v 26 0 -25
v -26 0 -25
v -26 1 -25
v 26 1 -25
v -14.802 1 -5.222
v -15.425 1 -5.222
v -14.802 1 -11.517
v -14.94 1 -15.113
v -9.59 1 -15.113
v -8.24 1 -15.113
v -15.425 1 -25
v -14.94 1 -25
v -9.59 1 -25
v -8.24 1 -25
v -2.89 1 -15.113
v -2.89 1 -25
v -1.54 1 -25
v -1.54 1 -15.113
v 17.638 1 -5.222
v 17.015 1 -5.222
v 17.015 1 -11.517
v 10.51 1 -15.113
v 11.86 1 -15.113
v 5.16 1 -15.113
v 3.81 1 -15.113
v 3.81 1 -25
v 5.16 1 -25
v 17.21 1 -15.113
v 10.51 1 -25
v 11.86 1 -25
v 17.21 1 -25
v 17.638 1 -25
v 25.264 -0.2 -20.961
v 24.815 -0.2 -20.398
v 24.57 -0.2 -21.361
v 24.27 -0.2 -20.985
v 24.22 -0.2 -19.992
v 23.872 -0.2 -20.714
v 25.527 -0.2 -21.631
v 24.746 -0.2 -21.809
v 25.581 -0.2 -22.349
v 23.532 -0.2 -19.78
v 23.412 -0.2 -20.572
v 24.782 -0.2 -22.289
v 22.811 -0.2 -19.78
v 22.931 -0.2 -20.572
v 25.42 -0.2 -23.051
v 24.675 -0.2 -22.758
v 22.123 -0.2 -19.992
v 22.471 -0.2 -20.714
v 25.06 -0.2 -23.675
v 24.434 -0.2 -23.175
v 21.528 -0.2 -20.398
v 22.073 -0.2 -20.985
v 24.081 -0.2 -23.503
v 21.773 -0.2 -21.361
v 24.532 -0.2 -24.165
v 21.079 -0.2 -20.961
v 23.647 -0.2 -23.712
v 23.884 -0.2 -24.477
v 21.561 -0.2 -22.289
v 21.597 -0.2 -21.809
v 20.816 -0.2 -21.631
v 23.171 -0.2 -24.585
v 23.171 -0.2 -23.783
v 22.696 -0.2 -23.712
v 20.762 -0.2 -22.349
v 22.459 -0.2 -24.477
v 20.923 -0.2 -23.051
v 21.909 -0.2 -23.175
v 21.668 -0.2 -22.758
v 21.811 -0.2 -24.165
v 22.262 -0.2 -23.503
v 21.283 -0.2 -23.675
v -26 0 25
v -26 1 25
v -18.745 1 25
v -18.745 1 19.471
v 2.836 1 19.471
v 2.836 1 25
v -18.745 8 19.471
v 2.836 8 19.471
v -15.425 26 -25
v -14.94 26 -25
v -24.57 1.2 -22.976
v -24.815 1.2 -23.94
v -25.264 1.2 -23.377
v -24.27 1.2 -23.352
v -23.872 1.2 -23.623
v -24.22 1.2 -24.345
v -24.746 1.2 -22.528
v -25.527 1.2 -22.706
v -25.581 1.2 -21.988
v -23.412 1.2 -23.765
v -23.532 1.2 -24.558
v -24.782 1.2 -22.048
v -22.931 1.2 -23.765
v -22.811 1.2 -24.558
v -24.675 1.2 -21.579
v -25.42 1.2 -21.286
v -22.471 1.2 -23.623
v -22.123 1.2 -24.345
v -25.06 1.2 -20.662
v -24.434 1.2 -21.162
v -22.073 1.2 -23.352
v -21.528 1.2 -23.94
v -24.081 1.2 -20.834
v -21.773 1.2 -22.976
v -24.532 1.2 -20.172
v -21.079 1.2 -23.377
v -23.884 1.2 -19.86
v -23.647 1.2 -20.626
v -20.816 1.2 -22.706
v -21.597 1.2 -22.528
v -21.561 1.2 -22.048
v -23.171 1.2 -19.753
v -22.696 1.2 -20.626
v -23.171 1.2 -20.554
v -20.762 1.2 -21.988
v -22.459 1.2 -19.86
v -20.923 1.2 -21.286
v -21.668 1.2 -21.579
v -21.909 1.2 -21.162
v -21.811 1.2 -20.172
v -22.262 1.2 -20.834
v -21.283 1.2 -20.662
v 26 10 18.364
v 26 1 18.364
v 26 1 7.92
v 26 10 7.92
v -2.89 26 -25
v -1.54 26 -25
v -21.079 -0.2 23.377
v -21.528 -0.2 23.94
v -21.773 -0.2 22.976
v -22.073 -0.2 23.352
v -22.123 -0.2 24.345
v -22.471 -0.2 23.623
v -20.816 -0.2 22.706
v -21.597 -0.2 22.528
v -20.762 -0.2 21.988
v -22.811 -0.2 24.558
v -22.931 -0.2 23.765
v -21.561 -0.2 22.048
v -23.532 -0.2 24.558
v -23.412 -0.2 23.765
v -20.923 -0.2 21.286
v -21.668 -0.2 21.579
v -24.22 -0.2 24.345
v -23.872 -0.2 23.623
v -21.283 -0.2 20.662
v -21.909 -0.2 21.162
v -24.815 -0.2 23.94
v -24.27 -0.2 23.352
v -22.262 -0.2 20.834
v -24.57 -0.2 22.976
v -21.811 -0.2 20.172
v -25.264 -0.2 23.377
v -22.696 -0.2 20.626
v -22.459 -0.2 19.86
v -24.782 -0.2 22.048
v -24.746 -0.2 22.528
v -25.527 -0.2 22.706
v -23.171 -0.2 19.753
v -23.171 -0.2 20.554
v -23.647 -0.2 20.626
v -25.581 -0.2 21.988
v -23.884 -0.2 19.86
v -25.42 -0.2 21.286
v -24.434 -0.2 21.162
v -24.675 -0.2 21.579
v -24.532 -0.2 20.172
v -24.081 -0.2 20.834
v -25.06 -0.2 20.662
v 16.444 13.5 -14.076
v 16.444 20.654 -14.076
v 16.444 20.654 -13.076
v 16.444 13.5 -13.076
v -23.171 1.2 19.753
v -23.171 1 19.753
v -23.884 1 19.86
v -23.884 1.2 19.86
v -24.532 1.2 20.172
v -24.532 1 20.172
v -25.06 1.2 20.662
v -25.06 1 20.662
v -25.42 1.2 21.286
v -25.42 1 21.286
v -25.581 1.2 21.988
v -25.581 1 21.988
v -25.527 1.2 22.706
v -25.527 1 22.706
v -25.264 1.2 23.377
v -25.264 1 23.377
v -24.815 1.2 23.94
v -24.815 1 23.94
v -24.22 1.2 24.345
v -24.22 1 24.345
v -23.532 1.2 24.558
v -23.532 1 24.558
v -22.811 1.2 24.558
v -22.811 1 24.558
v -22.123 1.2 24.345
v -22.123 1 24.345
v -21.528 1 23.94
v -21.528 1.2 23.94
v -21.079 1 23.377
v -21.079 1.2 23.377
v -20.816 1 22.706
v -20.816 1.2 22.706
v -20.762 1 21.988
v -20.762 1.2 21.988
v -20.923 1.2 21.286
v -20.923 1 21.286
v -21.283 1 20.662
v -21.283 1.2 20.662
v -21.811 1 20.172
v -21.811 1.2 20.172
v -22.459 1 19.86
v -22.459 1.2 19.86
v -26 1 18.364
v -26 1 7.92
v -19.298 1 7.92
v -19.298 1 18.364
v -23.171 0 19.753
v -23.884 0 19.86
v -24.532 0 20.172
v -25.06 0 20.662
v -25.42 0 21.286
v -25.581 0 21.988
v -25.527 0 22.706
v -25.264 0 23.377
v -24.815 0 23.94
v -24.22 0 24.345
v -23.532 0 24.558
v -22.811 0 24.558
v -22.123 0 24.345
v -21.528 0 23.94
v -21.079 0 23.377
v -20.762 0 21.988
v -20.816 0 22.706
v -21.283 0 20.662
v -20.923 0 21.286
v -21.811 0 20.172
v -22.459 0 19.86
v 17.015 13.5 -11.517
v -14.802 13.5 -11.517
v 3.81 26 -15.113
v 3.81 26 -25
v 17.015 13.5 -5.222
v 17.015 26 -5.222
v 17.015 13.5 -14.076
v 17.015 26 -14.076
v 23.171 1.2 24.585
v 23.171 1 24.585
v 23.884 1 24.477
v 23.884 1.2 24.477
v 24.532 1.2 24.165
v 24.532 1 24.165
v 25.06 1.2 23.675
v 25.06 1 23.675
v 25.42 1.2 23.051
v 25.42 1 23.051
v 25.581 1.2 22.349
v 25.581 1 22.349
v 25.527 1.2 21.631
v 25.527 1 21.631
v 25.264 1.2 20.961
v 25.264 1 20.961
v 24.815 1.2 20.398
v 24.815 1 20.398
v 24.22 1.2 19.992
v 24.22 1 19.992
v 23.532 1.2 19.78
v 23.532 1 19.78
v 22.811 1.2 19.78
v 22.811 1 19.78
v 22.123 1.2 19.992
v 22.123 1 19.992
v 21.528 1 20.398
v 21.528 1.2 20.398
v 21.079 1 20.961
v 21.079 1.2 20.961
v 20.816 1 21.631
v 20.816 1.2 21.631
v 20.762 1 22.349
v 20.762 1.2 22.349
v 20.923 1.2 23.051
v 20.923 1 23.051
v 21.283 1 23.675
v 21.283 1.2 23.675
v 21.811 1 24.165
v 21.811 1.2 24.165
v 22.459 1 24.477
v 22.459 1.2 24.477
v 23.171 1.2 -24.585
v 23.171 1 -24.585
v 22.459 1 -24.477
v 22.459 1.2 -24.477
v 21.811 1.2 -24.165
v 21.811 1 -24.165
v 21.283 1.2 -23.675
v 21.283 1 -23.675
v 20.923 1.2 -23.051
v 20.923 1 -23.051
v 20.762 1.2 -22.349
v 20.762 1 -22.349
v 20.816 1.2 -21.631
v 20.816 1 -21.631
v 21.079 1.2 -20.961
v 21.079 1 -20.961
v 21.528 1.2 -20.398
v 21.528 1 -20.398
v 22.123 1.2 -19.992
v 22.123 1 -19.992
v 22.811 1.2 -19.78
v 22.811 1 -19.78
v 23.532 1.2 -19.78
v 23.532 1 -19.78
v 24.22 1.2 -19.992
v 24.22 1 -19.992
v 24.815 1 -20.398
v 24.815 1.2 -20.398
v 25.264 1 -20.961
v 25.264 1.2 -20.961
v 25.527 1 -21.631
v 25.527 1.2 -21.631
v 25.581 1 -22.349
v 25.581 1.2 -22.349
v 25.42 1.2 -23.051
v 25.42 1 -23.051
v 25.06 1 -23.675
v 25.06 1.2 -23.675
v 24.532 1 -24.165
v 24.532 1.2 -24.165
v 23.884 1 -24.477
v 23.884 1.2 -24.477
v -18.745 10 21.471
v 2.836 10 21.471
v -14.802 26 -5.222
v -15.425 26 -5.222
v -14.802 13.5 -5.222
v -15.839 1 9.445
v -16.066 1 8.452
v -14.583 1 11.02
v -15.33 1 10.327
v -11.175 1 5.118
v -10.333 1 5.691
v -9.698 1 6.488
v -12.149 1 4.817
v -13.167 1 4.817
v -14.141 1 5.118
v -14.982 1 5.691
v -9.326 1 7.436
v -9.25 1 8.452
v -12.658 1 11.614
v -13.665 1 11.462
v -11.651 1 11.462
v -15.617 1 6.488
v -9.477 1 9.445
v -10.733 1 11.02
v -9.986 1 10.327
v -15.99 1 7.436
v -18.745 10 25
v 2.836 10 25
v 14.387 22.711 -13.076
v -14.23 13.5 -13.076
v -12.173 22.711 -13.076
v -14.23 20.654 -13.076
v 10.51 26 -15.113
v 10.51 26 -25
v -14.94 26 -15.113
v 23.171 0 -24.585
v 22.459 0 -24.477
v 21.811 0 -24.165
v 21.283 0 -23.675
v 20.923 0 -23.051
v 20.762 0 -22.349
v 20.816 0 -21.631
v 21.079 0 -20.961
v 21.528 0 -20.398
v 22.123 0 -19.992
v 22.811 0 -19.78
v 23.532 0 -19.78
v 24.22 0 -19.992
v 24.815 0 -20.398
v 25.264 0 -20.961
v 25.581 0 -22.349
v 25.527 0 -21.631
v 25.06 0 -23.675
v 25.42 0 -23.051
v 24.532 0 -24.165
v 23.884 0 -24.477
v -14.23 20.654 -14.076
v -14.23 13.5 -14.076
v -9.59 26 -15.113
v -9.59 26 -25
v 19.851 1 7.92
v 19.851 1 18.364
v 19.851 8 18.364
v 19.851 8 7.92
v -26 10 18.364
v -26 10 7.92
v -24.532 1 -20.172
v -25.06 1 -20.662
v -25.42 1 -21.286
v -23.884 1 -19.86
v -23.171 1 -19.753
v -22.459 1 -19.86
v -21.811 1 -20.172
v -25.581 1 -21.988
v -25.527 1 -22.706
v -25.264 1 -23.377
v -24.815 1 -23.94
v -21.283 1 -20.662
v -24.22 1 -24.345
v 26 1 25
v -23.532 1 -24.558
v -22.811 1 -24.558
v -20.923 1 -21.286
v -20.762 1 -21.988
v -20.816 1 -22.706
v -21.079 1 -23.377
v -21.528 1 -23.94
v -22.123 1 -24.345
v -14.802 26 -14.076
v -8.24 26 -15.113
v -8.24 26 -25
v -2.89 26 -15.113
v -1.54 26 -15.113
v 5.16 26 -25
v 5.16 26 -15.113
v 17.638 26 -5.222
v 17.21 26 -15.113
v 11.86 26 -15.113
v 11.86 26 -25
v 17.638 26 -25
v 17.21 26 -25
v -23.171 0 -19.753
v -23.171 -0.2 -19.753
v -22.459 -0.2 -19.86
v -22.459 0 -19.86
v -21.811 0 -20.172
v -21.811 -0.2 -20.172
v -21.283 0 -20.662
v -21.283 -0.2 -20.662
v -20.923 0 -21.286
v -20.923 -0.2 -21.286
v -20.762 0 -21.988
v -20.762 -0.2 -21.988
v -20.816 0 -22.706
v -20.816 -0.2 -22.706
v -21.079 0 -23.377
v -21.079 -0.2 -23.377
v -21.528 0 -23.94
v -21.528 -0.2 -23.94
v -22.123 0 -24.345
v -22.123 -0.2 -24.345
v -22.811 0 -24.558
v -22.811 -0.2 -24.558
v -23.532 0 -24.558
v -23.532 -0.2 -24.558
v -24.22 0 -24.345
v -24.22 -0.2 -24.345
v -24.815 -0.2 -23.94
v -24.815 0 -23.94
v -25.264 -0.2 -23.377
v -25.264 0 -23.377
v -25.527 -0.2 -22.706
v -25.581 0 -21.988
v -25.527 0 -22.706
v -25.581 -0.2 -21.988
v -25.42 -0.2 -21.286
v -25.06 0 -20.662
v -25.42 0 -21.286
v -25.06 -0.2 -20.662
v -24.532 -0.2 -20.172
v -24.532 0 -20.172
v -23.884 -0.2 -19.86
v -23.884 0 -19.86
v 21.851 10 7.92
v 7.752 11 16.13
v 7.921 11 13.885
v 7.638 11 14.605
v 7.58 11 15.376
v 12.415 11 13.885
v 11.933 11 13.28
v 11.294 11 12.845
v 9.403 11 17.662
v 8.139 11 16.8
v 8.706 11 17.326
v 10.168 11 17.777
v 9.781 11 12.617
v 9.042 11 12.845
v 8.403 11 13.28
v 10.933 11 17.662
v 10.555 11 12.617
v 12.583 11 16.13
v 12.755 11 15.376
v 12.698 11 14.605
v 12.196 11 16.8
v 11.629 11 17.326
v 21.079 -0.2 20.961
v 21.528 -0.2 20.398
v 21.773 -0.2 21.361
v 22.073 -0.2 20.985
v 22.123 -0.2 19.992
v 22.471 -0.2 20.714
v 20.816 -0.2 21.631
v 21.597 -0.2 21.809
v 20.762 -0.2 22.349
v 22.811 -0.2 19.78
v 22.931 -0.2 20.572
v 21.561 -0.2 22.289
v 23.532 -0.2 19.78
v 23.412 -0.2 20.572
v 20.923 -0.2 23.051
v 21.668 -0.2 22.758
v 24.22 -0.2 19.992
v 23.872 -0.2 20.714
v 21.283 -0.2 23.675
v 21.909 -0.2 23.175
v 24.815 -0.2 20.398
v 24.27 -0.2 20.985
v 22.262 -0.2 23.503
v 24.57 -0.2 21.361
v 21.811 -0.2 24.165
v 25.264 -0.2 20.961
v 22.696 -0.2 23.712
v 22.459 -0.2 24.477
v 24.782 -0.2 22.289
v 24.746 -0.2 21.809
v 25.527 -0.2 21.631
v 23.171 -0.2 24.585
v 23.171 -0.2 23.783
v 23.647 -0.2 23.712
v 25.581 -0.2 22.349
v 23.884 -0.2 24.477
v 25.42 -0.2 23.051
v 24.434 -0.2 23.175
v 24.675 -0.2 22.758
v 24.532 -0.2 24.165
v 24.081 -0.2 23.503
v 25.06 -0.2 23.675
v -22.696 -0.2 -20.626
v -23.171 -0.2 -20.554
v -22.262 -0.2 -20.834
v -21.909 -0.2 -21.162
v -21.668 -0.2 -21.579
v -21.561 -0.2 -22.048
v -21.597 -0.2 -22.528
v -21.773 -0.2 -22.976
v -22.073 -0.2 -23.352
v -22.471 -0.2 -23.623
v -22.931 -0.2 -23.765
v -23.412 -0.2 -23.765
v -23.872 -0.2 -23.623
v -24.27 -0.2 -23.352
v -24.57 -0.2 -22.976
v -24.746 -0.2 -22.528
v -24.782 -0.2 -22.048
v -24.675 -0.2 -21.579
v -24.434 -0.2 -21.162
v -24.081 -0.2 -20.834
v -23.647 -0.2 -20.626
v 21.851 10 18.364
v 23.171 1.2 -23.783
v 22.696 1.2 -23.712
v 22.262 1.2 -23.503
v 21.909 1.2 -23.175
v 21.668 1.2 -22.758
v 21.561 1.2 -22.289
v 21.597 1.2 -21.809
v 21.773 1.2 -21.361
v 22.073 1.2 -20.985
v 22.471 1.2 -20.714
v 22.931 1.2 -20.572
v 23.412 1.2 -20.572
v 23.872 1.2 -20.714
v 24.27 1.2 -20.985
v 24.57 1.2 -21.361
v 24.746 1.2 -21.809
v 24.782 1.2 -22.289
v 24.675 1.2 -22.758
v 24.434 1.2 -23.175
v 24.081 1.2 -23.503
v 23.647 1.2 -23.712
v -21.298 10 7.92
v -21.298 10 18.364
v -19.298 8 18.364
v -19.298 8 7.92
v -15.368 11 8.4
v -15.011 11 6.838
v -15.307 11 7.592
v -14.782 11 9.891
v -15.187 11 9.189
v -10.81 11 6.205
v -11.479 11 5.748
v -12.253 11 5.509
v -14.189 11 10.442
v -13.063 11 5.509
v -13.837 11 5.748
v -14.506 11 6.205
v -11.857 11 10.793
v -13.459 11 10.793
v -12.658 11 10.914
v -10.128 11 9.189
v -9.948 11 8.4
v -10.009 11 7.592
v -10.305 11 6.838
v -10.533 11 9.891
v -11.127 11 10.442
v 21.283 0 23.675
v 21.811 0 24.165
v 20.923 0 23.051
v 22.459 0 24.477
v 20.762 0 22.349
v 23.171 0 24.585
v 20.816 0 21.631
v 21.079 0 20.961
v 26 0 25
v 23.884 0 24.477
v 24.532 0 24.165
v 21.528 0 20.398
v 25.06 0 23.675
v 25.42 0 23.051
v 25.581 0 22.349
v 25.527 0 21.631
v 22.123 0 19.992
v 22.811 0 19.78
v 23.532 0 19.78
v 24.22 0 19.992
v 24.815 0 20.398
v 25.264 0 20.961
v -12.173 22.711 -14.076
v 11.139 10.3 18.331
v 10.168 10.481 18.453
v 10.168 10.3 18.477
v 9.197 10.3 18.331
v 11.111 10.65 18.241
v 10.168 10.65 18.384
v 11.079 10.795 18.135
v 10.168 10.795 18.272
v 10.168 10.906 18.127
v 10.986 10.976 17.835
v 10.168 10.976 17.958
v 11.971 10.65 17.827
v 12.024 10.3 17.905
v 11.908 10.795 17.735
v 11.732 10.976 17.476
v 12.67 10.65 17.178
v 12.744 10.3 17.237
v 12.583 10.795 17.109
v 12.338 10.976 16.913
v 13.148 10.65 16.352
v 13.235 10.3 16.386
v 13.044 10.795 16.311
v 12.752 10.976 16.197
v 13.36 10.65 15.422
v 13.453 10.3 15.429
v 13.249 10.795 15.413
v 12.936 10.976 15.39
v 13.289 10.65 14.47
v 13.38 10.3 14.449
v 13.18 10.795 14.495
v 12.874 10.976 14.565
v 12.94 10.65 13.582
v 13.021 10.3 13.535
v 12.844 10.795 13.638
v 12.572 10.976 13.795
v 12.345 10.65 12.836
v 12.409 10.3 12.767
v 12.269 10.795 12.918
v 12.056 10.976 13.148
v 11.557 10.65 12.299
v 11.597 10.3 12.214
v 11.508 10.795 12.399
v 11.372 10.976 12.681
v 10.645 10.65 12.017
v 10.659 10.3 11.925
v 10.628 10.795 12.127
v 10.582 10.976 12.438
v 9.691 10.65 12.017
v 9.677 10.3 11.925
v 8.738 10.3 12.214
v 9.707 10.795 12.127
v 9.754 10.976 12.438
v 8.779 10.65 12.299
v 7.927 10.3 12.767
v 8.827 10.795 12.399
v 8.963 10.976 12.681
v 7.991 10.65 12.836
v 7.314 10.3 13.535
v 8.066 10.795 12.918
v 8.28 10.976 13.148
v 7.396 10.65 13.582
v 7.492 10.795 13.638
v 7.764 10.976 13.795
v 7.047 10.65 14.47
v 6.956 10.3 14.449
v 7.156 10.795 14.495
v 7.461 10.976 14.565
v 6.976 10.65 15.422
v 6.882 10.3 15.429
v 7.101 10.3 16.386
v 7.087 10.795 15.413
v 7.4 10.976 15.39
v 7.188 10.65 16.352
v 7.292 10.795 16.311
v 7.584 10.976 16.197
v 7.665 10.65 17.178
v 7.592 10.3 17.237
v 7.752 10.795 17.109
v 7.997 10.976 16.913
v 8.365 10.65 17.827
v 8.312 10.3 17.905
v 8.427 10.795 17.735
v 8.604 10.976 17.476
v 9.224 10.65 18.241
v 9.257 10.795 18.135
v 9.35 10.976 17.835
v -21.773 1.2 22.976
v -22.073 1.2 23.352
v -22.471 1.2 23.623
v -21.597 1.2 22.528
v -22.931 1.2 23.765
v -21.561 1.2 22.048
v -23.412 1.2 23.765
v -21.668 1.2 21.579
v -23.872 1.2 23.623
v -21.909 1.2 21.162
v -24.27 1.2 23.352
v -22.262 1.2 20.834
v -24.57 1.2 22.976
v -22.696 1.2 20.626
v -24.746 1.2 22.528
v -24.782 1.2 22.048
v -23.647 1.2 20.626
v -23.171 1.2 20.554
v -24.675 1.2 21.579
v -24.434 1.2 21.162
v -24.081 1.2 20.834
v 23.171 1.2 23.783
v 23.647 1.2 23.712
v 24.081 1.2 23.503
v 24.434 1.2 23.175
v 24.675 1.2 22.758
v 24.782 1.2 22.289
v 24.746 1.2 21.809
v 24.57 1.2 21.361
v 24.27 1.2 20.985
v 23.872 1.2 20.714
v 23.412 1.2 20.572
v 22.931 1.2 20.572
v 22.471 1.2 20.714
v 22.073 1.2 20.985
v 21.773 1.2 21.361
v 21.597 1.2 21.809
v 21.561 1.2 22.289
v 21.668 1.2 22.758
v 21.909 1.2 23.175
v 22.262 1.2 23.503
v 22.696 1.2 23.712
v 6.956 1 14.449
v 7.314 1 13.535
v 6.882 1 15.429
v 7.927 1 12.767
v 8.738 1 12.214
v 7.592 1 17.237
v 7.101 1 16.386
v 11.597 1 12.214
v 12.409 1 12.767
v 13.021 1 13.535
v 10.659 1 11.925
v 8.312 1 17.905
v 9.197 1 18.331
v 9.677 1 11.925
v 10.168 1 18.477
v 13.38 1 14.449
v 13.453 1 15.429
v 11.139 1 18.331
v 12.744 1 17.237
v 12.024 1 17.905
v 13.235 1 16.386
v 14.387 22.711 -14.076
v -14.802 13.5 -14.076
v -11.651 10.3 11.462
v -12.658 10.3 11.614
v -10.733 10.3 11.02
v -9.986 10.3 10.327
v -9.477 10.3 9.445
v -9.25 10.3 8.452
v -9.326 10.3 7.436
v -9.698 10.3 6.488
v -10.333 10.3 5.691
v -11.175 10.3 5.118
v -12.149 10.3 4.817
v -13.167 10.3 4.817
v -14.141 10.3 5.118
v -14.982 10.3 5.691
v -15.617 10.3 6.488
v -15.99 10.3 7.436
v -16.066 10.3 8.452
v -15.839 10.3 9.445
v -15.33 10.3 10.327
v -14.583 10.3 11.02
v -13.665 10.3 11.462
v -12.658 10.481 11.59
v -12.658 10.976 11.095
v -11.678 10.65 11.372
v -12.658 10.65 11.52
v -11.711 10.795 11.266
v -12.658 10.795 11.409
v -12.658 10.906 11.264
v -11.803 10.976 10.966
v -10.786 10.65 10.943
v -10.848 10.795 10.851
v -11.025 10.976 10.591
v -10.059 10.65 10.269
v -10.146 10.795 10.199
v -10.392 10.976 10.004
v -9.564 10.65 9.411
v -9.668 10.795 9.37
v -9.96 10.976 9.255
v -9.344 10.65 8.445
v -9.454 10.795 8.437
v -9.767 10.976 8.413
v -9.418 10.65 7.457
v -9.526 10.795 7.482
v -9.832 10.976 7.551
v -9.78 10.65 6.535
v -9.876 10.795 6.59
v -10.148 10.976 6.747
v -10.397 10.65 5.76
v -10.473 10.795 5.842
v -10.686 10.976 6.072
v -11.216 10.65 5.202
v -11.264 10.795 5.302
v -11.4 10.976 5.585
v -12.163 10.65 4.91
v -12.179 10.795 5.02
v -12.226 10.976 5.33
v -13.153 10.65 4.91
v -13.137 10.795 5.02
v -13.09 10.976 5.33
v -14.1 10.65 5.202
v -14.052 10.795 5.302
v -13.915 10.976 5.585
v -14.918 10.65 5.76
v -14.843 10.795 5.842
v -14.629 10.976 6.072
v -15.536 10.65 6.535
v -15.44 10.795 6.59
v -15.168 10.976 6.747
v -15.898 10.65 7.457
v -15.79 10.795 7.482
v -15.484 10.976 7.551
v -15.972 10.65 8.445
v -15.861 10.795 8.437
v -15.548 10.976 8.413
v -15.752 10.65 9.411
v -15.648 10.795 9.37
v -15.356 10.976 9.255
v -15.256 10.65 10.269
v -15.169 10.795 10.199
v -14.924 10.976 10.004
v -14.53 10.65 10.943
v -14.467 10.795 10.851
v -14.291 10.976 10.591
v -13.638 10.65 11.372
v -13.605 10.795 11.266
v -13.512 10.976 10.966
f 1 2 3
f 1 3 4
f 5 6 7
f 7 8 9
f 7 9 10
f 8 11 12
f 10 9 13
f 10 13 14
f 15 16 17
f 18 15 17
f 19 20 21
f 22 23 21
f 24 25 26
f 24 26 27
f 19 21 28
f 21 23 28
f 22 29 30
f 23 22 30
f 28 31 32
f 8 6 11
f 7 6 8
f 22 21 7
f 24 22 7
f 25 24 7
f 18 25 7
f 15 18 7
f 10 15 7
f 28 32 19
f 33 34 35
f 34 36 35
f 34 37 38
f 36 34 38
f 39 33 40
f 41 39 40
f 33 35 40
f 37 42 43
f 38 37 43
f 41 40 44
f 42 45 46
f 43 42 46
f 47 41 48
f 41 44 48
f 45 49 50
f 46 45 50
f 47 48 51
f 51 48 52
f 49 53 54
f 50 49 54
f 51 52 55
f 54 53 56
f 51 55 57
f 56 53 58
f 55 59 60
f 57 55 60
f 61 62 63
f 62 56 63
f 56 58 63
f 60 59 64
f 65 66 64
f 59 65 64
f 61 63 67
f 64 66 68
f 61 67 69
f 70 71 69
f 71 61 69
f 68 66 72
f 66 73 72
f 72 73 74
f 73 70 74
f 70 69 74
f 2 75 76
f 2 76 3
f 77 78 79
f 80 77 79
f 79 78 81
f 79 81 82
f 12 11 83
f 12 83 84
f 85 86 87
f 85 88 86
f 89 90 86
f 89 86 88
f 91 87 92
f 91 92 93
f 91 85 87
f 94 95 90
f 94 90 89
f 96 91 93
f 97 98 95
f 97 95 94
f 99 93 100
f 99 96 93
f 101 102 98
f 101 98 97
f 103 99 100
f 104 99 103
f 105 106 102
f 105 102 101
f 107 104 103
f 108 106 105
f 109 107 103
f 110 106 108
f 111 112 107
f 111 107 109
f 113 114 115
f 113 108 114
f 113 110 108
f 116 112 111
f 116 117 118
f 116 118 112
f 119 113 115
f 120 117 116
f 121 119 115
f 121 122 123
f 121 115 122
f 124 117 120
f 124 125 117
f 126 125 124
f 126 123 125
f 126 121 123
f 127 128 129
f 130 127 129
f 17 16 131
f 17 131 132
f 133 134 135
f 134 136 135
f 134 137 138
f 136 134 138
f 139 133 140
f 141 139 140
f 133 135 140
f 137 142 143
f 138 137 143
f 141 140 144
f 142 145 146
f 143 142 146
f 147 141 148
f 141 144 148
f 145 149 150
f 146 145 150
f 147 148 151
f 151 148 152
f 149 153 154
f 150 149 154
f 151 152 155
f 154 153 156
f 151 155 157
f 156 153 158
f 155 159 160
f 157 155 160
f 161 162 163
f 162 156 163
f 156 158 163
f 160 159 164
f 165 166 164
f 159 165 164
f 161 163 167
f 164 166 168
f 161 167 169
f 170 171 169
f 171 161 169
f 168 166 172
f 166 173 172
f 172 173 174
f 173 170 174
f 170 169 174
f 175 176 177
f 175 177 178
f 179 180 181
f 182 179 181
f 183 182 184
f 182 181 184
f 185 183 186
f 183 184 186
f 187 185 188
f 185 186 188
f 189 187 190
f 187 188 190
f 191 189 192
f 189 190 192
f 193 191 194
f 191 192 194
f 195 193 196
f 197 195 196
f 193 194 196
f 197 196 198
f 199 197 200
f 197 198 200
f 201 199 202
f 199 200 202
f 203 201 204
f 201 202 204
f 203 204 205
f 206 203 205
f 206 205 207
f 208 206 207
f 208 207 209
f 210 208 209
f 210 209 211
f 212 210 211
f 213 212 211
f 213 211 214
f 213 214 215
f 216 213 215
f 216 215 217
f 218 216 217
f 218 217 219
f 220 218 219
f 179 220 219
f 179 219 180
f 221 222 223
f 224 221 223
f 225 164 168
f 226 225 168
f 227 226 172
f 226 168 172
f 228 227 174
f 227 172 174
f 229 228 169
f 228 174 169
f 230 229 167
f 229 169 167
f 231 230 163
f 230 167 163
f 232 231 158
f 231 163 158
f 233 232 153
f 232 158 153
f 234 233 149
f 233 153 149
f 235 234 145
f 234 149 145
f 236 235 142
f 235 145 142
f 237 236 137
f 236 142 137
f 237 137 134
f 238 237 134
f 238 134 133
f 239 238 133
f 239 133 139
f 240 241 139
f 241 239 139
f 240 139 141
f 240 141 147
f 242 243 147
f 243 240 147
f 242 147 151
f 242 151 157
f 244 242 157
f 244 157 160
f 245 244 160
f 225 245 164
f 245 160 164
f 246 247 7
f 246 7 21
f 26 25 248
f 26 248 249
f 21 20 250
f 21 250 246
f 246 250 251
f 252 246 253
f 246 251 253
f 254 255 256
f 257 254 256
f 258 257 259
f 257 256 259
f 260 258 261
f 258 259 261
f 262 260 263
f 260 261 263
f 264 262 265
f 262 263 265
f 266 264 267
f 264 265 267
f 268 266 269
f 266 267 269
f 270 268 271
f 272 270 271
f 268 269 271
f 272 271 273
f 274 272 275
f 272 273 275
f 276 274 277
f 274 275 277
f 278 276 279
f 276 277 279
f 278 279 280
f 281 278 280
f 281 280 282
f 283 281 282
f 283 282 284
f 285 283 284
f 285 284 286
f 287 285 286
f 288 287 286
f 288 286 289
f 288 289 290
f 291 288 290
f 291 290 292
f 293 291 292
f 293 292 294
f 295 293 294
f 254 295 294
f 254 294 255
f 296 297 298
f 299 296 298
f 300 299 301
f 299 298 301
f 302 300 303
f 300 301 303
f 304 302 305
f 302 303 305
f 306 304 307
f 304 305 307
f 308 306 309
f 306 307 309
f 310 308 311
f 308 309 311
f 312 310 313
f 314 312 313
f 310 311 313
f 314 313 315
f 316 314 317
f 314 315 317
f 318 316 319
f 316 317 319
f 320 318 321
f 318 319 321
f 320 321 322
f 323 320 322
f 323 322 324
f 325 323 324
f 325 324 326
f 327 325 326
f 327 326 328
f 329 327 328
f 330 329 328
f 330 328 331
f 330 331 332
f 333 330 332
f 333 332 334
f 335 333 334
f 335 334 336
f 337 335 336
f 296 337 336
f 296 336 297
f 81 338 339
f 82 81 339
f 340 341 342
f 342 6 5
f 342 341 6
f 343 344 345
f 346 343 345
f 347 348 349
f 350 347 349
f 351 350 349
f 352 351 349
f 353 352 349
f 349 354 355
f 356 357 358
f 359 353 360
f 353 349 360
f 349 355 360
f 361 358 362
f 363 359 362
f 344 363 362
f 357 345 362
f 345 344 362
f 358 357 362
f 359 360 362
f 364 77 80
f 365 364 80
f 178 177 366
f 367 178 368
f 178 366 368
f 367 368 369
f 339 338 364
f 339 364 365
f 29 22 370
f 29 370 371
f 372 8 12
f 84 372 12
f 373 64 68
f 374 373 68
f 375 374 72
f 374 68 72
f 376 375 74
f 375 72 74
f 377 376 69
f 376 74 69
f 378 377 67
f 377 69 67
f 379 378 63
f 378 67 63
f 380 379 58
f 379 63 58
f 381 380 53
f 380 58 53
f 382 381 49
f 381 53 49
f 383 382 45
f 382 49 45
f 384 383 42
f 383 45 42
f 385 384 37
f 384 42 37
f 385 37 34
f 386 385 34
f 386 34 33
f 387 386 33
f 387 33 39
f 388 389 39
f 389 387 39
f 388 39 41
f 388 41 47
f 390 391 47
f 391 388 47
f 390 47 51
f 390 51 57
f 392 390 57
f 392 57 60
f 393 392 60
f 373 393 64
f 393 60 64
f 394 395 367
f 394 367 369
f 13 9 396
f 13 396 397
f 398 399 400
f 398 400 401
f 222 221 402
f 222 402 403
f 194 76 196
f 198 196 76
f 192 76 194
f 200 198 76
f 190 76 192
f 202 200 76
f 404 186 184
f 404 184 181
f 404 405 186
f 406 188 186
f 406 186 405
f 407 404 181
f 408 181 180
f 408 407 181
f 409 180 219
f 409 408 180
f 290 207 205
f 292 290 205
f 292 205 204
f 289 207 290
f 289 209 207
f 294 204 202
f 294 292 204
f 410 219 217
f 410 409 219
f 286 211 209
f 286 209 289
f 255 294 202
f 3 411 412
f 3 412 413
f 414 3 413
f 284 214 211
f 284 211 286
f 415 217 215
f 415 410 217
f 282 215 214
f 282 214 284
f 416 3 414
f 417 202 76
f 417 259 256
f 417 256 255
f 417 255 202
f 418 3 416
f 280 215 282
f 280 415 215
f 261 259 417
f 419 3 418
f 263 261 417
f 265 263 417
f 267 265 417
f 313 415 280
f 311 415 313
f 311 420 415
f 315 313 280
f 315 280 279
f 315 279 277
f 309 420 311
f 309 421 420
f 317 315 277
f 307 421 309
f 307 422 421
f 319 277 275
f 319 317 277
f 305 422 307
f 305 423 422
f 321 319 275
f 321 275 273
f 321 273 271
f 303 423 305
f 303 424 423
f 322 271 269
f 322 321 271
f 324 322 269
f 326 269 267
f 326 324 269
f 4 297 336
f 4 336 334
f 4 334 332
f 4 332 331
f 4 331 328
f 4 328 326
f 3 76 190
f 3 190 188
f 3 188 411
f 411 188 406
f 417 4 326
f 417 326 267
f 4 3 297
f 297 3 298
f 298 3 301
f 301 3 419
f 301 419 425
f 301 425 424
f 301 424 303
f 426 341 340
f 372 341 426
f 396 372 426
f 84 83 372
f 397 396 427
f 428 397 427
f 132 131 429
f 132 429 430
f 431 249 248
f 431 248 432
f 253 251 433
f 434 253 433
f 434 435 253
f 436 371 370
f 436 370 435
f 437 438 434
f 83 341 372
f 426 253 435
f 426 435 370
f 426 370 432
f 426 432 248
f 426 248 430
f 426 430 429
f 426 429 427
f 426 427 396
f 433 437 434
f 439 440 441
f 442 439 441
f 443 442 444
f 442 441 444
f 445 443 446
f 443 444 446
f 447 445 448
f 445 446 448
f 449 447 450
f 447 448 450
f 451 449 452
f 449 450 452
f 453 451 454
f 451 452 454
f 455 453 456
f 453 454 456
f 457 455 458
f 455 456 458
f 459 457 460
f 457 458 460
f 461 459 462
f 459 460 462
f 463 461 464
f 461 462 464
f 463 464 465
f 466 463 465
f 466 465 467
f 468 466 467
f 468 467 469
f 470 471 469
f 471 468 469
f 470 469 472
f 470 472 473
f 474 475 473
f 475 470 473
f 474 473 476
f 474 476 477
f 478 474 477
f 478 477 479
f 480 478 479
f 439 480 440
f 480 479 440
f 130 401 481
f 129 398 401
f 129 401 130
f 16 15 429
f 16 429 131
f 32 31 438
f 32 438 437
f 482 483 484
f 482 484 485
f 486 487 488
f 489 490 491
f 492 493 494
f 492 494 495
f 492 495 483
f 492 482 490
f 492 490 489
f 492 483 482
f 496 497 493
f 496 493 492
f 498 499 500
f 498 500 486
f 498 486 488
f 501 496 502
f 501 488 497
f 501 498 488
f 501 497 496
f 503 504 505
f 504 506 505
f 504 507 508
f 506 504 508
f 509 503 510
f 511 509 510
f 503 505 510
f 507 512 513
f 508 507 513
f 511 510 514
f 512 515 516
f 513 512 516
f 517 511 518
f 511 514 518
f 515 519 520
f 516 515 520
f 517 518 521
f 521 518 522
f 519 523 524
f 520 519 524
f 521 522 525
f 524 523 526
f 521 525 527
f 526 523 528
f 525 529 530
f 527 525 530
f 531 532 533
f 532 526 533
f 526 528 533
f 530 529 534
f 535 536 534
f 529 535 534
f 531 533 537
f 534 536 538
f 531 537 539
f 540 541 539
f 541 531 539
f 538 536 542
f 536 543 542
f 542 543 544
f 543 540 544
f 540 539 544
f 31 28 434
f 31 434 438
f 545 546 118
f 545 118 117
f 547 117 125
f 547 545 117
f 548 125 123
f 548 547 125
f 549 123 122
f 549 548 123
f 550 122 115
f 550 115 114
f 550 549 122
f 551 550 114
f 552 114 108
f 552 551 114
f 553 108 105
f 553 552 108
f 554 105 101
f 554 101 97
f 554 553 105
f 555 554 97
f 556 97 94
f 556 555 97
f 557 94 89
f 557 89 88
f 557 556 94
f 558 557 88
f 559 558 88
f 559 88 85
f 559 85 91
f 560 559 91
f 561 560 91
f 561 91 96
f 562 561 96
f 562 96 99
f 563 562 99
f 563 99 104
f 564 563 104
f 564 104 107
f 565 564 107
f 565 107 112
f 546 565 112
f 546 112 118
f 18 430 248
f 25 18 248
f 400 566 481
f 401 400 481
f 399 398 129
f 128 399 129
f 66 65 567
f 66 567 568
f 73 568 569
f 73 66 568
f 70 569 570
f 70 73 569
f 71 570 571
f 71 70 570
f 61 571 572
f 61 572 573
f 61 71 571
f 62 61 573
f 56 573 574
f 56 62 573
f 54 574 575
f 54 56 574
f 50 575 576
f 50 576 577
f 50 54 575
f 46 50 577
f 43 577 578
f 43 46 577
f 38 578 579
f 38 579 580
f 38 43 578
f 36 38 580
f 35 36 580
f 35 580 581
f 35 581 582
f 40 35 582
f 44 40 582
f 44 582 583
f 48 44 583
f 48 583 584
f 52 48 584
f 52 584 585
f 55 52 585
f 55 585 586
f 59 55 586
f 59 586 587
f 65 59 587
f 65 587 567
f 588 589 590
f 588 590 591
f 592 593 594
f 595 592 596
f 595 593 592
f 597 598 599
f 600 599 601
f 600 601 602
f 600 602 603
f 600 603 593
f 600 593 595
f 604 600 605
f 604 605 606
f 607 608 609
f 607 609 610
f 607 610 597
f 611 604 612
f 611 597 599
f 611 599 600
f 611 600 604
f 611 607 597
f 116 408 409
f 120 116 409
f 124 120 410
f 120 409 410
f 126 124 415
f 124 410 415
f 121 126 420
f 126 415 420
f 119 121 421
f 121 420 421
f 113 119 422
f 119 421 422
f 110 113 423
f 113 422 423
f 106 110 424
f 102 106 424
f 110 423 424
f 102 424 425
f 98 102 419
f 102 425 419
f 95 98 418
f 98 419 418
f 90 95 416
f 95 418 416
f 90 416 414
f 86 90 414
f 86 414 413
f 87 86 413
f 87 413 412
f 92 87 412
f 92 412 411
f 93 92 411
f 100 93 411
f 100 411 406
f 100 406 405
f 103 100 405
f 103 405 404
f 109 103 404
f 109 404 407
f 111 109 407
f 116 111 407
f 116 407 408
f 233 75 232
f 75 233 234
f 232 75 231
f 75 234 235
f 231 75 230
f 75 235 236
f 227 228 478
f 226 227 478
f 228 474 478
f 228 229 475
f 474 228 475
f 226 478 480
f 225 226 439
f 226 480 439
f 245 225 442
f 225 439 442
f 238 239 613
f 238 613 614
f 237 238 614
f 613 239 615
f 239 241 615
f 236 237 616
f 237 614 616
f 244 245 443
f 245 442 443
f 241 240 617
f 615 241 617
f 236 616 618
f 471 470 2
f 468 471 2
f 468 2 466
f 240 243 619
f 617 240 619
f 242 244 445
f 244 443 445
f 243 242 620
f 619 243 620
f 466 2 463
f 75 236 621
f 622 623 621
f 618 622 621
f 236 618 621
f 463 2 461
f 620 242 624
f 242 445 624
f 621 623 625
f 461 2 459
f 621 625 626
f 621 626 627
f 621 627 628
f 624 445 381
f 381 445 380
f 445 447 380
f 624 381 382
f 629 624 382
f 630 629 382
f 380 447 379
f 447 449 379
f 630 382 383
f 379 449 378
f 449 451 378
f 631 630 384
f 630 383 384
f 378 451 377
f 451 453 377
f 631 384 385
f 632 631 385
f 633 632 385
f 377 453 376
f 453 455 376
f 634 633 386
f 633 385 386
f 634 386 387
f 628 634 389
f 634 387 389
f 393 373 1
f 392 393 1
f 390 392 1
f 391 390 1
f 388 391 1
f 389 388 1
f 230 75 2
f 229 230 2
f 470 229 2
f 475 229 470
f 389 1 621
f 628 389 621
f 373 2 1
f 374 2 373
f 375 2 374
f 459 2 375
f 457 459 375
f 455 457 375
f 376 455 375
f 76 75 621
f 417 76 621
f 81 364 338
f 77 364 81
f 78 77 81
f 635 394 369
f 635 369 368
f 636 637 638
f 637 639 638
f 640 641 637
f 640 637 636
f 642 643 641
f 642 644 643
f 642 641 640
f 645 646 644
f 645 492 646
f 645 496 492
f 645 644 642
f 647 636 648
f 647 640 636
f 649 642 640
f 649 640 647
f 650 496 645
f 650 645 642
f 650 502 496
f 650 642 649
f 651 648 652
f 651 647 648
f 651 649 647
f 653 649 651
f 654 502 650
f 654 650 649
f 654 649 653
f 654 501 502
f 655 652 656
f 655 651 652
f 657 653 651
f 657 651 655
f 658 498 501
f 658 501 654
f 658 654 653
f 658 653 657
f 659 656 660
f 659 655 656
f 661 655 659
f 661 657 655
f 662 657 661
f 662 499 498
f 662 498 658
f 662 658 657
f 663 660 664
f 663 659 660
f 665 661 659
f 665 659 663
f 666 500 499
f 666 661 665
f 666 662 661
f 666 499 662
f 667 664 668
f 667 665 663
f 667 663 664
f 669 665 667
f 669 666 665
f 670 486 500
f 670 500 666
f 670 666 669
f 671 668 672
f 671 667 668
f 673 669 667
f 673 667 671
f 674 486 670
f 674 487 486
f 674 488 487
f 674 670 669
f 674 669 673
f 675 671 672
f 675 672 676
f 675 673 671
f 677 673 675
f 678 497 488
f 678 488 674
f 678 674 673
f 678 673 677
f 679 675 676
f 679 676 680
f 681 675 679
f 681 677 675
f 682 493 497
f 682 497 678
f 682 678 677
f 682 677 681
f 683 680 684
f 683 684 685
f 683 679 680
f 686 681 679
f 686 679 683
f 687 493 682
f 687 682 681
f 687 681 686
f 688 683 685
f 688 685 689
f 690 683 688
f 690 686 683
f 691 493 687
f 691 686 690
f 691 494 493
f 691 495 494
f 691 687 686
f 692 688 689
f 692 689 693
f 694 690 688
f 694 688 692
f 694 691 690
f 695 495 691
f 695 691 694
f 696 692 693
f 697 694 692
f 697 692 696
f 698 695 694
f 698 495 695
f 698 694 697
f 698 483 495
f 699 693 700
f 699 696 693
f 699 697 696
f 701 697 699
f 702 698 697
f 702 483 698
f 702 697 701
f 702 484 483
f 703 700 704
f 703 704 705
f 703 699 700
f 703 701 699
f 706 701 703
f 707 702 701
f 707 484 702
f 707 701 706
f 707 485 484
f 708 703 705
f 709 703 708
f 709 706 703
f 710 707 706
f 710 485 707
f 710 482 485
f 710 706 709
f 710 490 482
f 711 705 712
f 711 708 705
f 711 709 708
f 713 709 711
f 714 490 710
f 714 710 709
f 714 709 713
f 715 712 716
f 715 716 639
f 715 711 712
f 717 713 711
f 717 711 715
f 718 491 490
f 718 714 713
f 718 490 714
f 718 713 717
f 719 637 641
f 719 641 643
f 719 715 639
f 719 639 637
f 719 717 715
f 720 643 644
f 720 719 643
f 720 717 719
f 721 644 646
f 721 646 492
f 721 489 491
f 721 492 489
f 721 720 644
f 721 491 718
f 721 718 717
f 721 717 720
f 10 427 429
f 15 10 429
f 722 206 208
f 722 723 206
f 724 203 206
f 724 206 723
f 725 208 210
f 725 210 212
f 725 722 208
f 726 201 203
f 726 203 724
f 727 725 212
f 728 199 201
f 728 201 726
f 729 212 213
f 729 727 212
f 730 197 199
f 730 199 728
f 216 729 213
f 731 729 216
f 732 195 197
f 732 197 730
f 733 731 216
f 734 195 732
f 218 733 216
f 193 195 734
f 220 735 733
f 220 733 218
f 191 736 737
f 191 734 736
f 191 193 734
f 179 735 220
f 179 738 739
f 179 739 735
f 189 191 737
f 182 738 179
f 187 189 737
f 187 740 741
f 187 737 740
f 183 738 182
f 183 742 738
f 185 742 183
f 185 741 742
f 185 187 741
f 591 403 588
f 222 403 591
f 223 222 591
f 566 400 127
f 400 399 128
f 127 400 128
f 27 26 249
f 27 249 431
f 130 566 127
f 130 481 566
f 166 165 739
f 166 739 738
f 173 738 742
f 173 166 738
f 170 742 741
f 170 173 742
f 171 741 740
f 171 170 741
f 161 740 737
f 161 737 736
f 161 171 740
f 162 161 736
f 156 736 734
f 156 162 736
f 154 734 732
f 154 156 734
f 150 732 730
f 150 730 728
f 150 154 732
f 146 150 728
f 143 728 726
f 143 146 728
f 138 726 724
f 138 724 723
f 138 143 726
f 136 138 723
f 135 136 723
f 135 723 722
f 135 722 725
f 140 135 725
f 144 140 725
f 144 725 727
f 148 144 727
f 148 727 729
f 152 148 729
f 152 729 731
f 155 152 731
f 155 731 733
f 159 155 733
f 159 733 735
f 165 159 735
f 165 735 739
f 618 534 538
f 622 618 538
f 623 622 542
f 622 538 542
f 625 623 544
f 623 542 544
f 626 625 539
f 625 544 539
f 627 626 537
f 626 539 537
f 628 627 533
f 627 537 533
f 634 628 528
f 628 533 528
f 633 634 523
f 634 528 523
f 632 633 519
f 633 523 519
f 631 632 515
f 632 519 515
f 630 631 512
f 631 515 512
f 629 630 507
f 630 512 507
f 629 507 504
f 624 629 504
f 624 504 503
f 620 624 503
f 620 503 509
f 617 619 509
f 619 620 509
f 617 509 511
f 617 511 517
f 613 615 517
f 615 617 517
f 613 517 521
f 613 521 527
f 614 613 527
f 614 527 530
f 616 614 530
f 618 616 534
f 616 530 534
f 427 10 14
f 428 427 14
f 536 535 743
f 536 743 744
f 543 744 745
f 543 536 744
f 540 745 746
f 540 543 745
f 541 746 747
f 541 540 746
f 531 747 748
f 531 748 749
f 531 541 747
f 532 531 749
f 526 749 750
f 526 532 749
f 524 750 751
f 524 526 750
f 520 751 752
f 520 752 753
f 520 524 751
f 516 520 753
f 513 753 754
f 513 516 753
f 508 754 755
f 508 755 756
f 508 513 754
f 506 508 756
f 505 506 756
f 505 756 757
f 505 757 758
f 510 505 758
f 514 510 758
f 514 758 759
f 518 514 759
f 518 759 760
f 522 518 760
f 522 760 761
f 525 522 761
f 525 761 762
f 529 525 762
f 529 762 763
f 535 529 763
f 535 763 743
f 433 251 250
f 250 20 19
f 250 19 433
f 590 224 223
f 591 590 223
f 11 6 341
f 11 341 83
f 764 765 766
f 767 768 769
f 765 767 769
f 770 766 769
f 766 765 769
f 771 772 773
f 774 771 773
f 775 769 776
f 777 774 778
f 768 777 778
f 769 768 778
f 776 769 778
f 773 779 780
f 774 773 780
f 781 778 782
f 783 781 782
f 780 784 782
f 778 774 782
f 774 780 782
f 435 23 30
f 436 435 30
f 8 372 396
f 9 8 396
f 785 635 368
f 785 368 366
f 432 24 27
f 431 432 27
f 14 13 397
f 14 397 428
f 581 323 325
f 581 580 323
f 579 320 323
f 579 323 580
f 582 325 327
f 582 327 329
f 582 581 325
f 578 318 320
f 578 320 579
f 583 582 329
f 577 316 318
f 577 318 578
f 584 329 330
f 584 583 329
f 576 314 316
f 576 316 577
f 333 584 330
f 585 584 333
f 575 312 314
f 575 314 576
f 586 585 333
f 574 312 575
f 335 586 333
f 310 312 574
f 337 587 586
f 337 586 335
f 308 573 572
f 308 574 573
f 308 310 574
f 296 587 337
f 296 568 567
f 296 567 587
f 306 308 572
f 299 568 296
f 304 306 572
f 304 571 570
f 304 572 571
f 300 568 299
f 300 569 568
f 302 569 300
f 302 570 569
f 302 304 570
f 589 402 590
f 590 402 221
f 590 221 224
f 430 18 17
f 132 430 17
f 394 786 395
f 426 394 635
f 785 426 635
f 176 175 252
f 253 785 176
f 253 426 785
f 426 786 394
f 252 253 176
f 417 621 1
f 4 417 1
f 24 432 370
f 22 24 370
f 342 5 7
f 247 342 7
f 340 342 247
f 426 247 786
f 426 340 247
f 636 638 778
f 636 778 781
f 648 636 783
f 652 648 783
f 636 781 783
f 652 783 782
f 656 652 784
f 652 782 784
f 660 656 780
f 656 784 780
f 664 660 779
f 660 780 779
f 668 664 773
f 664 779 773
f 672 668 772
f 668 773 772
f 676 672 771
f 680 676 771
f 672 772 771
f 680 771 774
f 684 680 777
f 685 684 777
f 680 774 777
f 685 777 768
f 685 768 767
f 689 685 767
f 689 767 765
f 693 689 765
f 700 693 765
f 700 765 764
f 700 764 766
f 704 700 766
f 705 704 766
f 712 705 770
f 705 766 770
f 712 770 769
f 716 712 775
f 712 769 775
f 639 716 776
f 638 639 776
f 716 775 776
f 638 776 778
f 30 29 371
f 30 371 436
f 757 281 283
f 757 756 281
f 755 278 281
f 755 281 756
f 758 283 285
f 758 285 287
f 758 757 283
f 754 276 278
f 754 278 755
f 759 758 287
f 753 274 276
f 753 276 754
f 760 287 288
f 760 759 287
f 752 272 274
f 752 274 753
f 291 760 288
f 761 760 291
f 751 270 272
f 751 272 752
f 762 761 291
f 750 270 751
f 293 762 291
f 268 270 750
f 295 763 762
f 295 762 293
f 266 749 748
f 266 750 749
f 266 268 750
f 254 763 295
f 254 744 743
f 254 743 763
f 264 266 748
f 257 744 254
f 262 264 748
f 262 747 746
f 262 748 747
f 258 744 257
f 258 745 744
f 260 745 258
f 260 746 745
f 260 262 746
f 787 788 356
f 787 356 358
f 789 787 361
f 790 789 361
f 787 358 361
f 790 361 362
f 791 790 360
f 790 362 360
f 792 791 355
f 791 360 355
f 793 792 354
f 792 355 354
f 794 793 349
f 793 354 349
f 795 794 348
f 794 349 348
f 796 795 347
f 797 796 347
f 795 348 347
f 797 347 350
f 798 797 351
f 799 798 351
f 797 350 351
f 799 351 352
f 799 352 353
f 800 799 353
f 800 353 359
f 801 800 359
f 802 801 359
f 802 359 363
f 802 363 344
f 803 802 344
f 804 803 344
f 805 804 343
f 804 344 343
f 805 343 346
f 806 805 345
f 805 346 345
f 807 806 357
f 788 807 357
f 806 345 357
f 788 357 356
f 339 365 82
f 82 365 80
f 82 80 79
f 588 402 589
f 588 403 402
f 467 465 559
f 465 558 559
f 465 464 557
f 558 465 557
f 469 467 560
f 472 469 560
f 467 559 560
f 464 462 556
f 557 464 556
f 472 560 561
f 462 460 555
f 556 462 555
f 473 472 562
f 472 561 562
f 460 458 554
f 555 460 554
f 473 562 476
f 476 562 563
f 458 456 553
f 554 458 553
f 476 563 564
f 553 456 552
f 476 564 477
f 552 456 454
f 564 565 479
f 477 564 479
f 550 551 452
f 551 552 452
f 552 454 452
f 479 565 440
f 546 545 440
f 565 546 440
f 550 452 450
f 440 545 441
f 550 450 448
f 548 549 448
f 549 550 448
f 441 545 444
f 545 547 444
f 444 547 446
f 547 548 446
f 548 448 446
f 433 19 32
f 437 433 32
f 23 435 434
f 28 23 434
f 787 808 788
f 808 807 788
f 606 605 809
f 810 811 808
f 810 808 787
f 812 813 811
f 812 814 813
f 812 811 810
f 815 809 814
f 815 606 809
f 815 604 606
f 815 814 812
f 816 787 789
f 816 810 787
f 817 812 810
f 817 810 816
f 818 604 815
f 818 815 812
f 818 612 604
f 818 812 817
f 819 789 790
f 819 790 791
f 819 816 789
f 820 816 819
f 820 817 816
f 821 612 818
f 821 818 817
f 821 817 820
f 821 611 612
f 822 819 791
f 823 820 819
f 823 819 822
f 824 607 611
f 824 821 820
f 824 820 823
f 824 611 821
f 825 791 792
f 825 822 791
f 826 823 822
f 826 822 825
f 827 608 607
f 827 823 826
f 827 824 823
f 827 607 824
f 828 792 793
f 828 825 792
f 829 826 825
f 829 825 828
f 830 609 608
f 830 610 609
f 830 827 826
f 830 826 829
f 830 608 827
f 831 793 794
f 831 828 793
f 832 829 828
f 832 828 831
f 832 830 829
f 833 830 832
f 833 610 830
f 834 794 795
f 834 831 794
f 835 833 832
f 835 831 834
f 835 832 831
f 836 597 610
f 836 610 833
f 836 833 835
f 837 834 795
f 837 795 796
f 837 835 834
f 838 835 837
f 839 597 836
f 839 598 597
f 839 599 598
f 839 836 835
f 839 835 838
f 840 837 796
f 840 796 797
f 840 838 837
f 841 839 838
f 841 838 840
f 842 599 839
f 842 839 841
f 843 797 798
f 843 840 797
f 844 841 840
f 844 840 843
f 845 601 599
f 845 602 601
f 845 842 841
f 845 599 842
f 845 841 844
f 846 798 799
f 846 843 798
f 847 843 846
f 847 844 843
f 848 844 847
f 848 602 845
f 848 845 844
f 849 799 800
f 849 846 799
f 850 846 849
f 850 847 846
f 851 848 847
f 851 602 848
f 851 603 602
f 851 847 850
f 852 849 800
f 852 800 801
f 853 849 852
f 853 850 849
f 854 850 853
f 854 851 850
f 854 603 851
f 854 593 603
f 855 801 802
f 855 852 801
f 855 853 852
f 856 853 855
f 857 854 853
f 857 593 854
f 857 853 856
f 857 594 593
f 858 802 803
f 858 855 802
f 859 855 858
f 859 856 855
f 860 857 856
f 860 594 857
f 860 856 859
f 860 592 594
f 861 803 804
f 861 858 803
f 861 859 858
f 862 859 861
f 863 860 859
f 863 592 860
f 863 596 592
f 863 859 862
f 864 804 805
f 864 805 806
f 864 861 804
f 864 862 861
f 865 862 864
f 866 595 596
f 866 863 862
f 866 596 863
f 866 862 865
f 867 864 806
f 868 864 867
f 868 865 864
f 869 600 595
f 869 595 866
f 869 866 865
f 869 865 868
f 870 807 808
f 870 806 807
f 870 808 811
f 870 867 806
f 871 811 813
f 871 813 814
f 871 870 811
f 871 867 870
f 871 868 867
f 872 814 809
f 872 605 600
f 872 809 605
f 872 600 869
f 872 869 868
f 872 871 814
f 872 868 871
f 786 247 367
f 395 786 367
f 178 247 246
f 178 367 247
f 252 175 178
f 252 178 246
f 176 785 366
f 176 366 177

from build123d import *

# Parameters (mm, degrees)
SKETCH1_W                = 52
SKETCH1_H                = 50
BOSS_EXTRUDE1_DEPTH      = 1
SKETCH2_W                = 21.580611169
SKETCH2_H                = 5.529031909
BOSS_EXTRUDE2_DEPTH      = 9
SKETCH2_W_2              = 6.701953473
SKETCH2_H_2              = 10.444462457
BOSS_EXTRUDE2_2_DEPTH    = 9
SKETCH2_W_3              = 6.148604469
BOSS_EXTRUDE2_3_DEPTH    = 9
SKETCH3_R                = 3.417378128
BOSS_EXTRUDE3_DEPTH      = 10
SKETCH3_R_2              = 3.294779793
BOSS_EXTRUDE3_2_DEPTH    = 10
SKETCH4_R                = 1.614757822
CUT_EXTRUDE1_DEPTH       = 10
BOSS_EXTRUDE4_DEPTH      = 0.2
BOSS_EXTRUDE4_DEPTH_BACK = 1.2
SKETCH5_R                = 2.415956226
SKETCH5_R_2              = 1.614757822
SKETCH6_W                = 33.06260301
SKETCH6_H                = 19.777768771
BOSS_EXTRUDE5_DEPTH      = 25
SKETCH7_W                = 5.35
SKETCH7_H                = 9.886655319
CUT_EXTRUDE2_DEPTH       = 25
SKETCH8_W                = 31.81756775
SKETCH8_H                = 8.853584069
CUT_EXTRUDE3_DEPTH       = 12.5
SKETCH9_W                = 31.81756775
SKETCH9_H                = 6.294344924
CUT_EXTRUDE4_DEPTH       = 12.5
BOSS_EXTRUDE6_DEPTH      = 1
FILLET1_R                = 0.7
FILLET2_R                = 0.7
CHAMFER1_SIZE            = 2
CHAMFER2_SIZE            = 2
CHAMFER3_SIZE            = 2


with BuildPart() as part:
    # Sketch1 → Boss-Extrude1 (new body)
    with BuildSketch(Plane(origin=(0, 0, 0), x_dir=(1, 0, 0), z_dir=(0, 1, 0))):
        Rectangle(SKETCH1_W, SKETCH1_H)
    extrude(amount=BOSS_EXTRUDE1_DEPTH)

    # Sketch4 → Cut-Extrude1 (cut)
    with BuildSketch(Plane(origin=(0, 1, 0), x_dir=(1, 0, 0), z_dir=(0, 1, 0))):
        with Locations(Location((-23.171489557, 22.168544487, 0), (0, 0, 270))):
            Circle(SKETCH4_R)
        with Locations(Location((23.171489557, 22.168544487, 0), (0, 0, 90))):
            Circle(SKETCH4_R)
        with Locations(Location((23.171489557, -22.168544487, 0), (0, 0, 270))):
            Circle(SKETCH4_R)
        with Locations(Location((-23.171489557, -22.168544487, 0), (0, 0, 90))):
            Circle(SKETCH4_R)
    extrude(amount=-CUT_EXTRUDE1_DEPTH, mode=Mode.SUBTRACT)

    # Sketch5 → Boss-Extrude4 (add, two sides: drawn at the far end of the back side and taken through both)
    # profile 1 of 4: a face of its own
    with BuildSketch(Plane(origin=(0, 1, 0), x_dir=(1, 0, 0), z_dir=(0, 1, 0)).offset(-BOSS_EXTRUDE4_DEPTH_BACK)):
        with Locations(Location((-23.171489557, 22.168544487, 0), (0, 0, 270))):
            Circle(SKETCH5_R)
        with Locations(Location((-23.171489557, 22.168544487, 0), (0, 0, 270))):
            Circle(SKETCH5_R_2, mode=Mode.SUBTRACT)
    # profile 2 of 4: a face of its own
    with BuildSketch(Plane(origin=(0, 1, 0), x_dir=(1, 0, 0), z_dir=(0, 1, 0)).offset(-BOSS_EXTRUDE4_DEPTH_BACK)):
        with Locations(Location((23.171489557, 22.168544487, 0), (0, 0, 90))):
            Circle(SKETCH5_R)
        with Locations(Location((23.171489557, 22.168544487, 0), (0, 0, 90))):
            Circle(SKETCH5_R_2, mode=Mode.SUBTRACT)
    # profile 3 of 4: a face of its own
    with BuildSketch(Plane(origin=(0, 1, 0), x_dir=(1, 0, 0), z_dir=(0, 1, 0)).offset(-BOSS_EXTRUDE4_DEPTH_BACK)):
        with Locations(Location((23.171489557, -22.168544487, 0), (0, 0, 270))):
            Circle(SKETCH5_R)
        with Locations(Location((23.171489557, -22.168544487, 0), (0, 0, 270))):
            Circle(SKETCH5_R_2, mode=Mode.SUBTRACT)
    # profile 4 of 4: a face of its own
    with BuildSketch(Plane(origin=(0, 1, 0), x_dir=(1, 0, 0), z_dir=(0, 1, 0)).offset(-BOSS_EXTRUDE4_DEPTH_BACK)):
        with Locations(Location((-23.171489557, -22.168544487, 0), (0, 0, 90))):
            Circle(SKETCH5_R)
        with Locations(Location((-23.171489557, -22.168544487, 0), (0, 0, 90))):
            Circle(SKETCH5_R_2, mode=Mode.SUBTRACT)
    extrude(amount=BOSS_EXTRUDE4_DEPTH + BOSS_EXTRUDE4_DEPTH_BACK)


with BuildPart() as body_2:
    # Sketch2 → Boss-Extrude2 (new body)
    with BuildSketch(Plane(origin=(0, 1, 0), x_dir=(1, 0, 0), z_dir=(0, 1, 0))):
        with Locations((-7.954391938, -22.235484046)):
            Rectangle(SKETCH2_W, SKETCH2_H)
    extrude(amount=BOSS_EXTRUDE2_DEPTH)

    # Chamfer2
    chamfer2_edges = [body_2.edges().sort_by_distance(p)[0] for p in [
        (-7.954391938, 10, 19.470968091),
    ]]
    chamfer(chamfer2_edges, length=CHAMFER2_SIZE)


with BuildPart() as body_3:
    # Sketch2 → Boss-Extrude2 2 (new body)
    with BuildSketch(Plane(origin=(0, 1, 0), x_dir=(1, 0, 0), z_dir=(0, 1, 0))):
        with Locations((-22.649023263, -13.142038854)):
            Rectangle(SKETCH2_W_2, SKETCH2_H_2)
    extrude(amount=BOSS_EXTRUDE2_2_DEPTH)

    # Chamfer3
    chamfer3_edges = [body_3.edges().sort_by_distance(p)[0] for p in [
        (-19.298046527, 10, 13.142038853),
    ]]
    chamfer(chamfer3_edges, length=CHAMFER3_SIZE)


with BuildPart() as body_4:
    # Sketch2 → Boss-Extrude2 3 (new body)
    with BuildSketch(Plane(origin=(0, 1, 0), x_dir=(1, 0, 0), z_dir=(0, 1, 0))):
        with Locations((22.925697766, -13.142038854)):
            Rectangle(SKETCH2_W_3, SKETCH2_H_2)
    extrude(amount=BOSS_EXTRUDE2_3_DEPTH)

    # Chamfer1
    chamfer1_edges = [body_4.edges().sort_by_distance(p)[0] for p in [
        (19.851395531, 10, 13.142038853),
    ]]
    chamfer(chamfer1_edges, length=CHAMFER1_SIZE)


with BuildPart() as body_5:
    # Sketch3 → Boss-Extrude3 (new body)
    with BuildSketch(Plane(origin=(0, 1, 0), x_dir=(1, 0, 0), z_dir=(0, 1, 0))):
        with Locations(Location((-12.657858475, -8.196482127, 0), (0, 0, 270))):
            Circle(SKETCH3_R)
    extrude(amount=BOSS_EXTRUDE3_DEPTH)

    # Fillet2
    fillet2_edges = [body_5.edges().sort_by_distance(p)[0] for p in [
        (-12.657858475, 11, 4.779103999),
    ]]
    fillet(fillet2_edges, radius=FILLET2_R)


with BuildPart() as body_6:
    # Sketch3 → Boss-Extrude3 2 (new body)
    with BuildSketch(Plane(origin=(0, 1, 0), x_dir=(1, 0, 0), z_dir=(0, 1, 0))):
        with Locations(Location((10.167787955, -15.182513307, 0), (0, 0, 270))):
            Circle(SKETCH3_R_2)
    extrude(amount=BOSS_EXTRUDE3_2_DEPTH)

    # Fillet1
    fillet1_edges = [body_6.edges().sort_by_distance(p)[0] for p in [
        (10.167787955, 11, 11.887733514),
    ]]
    fillet(fillet1_edges, radius=FILLET1_R)


with BuildPart() as body_7:
    # Sketch6 → Boss-Extrude5 (new body)
    with BuildSketch(Plane(origin=(0, 1, 0), x_dir=(1, 0, 0), z_dir=(0, 1, 0))):
        with Locations((1.106698009, 15.111115615)):
            Rectangle(SKETCH6_W, SKETCH6_H)
    extrude(amount=BOSS_EXTRUDE5_DEPTH)

    # Sketch7 → Cut-Extrude2 (cut)
    with BuildSketch(Plane(origin=(0, 26, 0), x_dir=(1, 0, 0), z_dir=(0, 1, 0))):
        with Locations((-12.265423117, 20.056672341)):
            Rectangle(SKETCH7_W, SKETCH7_H)
        with Locations((-5.565423117, 20.056672341)):
            Rectangle(SKETCH7_W, SKETCH7_H)
        with Locations((1.134576883, 20.056672341)):
            Rectangle(SKETCH7_W, SKETCH7_H)
        with Locations((7.834576883, 20.056672341)):
            Rectangle(SKETCH7_W, SKETCH7_H)
        with Locations((14.534576883, 20.056672341)):
            Rectangle(SKETCH7_W, SKETCH7_H)
    extrude(amount=-CUT_EXTRUDE2_DEPTH, mode=Mode.SUBTRACT)

    # Sketch8 → Cut-Extrude3 (cut)
    with BuildSketch(Plane(origin=(0, 26, 0), x_dir=(1, 0, 0), z_dir=(0, 1, 0))):
        with Locations((1.106698009, 9.649023264)):
            Rectangle(SKETCH8_W, SKETCH8_H)
    extrude(amount=-CUT_EXTRUDE3_DEPTH, mode=Mode.SUBTRACT)

    # Sketch9 → Cut-Extrude4 (cut)
    with BuildSketch(Plane(origin=(0, 13.5, 0), x_dir=(1, 0, 0), z_dir=(0, 1, 0))):
        with Locations((1.106698009, 8.369403691)):
            Rectangle(SKETCH9_W, SKETCH9_H)
    extrude(amount=-CUT_EXTRUDE4_DEPTH, mode=Mode.SUBTRACT)

    # Sketch10 → Boss-Extrude6 (add)
    with BuildSketch(Plane.XY.offset(-14.075815298)):
        Polygon((-14.230124214, 13.5), (-14.230124214, 20.654305968), (-12.173426573, 22.711003608), (14.386822591, 22.711003608), (16.443520231, 20.654305968), (16.443520231, 13.5), align=None)
    extrude(amount=BOSS_EXTRUDE6_DEPTH)


solid = Compound([part.part, body_2.part, body_3.part, body_4.part, body_5.part, body_6.part, body_7.part])
